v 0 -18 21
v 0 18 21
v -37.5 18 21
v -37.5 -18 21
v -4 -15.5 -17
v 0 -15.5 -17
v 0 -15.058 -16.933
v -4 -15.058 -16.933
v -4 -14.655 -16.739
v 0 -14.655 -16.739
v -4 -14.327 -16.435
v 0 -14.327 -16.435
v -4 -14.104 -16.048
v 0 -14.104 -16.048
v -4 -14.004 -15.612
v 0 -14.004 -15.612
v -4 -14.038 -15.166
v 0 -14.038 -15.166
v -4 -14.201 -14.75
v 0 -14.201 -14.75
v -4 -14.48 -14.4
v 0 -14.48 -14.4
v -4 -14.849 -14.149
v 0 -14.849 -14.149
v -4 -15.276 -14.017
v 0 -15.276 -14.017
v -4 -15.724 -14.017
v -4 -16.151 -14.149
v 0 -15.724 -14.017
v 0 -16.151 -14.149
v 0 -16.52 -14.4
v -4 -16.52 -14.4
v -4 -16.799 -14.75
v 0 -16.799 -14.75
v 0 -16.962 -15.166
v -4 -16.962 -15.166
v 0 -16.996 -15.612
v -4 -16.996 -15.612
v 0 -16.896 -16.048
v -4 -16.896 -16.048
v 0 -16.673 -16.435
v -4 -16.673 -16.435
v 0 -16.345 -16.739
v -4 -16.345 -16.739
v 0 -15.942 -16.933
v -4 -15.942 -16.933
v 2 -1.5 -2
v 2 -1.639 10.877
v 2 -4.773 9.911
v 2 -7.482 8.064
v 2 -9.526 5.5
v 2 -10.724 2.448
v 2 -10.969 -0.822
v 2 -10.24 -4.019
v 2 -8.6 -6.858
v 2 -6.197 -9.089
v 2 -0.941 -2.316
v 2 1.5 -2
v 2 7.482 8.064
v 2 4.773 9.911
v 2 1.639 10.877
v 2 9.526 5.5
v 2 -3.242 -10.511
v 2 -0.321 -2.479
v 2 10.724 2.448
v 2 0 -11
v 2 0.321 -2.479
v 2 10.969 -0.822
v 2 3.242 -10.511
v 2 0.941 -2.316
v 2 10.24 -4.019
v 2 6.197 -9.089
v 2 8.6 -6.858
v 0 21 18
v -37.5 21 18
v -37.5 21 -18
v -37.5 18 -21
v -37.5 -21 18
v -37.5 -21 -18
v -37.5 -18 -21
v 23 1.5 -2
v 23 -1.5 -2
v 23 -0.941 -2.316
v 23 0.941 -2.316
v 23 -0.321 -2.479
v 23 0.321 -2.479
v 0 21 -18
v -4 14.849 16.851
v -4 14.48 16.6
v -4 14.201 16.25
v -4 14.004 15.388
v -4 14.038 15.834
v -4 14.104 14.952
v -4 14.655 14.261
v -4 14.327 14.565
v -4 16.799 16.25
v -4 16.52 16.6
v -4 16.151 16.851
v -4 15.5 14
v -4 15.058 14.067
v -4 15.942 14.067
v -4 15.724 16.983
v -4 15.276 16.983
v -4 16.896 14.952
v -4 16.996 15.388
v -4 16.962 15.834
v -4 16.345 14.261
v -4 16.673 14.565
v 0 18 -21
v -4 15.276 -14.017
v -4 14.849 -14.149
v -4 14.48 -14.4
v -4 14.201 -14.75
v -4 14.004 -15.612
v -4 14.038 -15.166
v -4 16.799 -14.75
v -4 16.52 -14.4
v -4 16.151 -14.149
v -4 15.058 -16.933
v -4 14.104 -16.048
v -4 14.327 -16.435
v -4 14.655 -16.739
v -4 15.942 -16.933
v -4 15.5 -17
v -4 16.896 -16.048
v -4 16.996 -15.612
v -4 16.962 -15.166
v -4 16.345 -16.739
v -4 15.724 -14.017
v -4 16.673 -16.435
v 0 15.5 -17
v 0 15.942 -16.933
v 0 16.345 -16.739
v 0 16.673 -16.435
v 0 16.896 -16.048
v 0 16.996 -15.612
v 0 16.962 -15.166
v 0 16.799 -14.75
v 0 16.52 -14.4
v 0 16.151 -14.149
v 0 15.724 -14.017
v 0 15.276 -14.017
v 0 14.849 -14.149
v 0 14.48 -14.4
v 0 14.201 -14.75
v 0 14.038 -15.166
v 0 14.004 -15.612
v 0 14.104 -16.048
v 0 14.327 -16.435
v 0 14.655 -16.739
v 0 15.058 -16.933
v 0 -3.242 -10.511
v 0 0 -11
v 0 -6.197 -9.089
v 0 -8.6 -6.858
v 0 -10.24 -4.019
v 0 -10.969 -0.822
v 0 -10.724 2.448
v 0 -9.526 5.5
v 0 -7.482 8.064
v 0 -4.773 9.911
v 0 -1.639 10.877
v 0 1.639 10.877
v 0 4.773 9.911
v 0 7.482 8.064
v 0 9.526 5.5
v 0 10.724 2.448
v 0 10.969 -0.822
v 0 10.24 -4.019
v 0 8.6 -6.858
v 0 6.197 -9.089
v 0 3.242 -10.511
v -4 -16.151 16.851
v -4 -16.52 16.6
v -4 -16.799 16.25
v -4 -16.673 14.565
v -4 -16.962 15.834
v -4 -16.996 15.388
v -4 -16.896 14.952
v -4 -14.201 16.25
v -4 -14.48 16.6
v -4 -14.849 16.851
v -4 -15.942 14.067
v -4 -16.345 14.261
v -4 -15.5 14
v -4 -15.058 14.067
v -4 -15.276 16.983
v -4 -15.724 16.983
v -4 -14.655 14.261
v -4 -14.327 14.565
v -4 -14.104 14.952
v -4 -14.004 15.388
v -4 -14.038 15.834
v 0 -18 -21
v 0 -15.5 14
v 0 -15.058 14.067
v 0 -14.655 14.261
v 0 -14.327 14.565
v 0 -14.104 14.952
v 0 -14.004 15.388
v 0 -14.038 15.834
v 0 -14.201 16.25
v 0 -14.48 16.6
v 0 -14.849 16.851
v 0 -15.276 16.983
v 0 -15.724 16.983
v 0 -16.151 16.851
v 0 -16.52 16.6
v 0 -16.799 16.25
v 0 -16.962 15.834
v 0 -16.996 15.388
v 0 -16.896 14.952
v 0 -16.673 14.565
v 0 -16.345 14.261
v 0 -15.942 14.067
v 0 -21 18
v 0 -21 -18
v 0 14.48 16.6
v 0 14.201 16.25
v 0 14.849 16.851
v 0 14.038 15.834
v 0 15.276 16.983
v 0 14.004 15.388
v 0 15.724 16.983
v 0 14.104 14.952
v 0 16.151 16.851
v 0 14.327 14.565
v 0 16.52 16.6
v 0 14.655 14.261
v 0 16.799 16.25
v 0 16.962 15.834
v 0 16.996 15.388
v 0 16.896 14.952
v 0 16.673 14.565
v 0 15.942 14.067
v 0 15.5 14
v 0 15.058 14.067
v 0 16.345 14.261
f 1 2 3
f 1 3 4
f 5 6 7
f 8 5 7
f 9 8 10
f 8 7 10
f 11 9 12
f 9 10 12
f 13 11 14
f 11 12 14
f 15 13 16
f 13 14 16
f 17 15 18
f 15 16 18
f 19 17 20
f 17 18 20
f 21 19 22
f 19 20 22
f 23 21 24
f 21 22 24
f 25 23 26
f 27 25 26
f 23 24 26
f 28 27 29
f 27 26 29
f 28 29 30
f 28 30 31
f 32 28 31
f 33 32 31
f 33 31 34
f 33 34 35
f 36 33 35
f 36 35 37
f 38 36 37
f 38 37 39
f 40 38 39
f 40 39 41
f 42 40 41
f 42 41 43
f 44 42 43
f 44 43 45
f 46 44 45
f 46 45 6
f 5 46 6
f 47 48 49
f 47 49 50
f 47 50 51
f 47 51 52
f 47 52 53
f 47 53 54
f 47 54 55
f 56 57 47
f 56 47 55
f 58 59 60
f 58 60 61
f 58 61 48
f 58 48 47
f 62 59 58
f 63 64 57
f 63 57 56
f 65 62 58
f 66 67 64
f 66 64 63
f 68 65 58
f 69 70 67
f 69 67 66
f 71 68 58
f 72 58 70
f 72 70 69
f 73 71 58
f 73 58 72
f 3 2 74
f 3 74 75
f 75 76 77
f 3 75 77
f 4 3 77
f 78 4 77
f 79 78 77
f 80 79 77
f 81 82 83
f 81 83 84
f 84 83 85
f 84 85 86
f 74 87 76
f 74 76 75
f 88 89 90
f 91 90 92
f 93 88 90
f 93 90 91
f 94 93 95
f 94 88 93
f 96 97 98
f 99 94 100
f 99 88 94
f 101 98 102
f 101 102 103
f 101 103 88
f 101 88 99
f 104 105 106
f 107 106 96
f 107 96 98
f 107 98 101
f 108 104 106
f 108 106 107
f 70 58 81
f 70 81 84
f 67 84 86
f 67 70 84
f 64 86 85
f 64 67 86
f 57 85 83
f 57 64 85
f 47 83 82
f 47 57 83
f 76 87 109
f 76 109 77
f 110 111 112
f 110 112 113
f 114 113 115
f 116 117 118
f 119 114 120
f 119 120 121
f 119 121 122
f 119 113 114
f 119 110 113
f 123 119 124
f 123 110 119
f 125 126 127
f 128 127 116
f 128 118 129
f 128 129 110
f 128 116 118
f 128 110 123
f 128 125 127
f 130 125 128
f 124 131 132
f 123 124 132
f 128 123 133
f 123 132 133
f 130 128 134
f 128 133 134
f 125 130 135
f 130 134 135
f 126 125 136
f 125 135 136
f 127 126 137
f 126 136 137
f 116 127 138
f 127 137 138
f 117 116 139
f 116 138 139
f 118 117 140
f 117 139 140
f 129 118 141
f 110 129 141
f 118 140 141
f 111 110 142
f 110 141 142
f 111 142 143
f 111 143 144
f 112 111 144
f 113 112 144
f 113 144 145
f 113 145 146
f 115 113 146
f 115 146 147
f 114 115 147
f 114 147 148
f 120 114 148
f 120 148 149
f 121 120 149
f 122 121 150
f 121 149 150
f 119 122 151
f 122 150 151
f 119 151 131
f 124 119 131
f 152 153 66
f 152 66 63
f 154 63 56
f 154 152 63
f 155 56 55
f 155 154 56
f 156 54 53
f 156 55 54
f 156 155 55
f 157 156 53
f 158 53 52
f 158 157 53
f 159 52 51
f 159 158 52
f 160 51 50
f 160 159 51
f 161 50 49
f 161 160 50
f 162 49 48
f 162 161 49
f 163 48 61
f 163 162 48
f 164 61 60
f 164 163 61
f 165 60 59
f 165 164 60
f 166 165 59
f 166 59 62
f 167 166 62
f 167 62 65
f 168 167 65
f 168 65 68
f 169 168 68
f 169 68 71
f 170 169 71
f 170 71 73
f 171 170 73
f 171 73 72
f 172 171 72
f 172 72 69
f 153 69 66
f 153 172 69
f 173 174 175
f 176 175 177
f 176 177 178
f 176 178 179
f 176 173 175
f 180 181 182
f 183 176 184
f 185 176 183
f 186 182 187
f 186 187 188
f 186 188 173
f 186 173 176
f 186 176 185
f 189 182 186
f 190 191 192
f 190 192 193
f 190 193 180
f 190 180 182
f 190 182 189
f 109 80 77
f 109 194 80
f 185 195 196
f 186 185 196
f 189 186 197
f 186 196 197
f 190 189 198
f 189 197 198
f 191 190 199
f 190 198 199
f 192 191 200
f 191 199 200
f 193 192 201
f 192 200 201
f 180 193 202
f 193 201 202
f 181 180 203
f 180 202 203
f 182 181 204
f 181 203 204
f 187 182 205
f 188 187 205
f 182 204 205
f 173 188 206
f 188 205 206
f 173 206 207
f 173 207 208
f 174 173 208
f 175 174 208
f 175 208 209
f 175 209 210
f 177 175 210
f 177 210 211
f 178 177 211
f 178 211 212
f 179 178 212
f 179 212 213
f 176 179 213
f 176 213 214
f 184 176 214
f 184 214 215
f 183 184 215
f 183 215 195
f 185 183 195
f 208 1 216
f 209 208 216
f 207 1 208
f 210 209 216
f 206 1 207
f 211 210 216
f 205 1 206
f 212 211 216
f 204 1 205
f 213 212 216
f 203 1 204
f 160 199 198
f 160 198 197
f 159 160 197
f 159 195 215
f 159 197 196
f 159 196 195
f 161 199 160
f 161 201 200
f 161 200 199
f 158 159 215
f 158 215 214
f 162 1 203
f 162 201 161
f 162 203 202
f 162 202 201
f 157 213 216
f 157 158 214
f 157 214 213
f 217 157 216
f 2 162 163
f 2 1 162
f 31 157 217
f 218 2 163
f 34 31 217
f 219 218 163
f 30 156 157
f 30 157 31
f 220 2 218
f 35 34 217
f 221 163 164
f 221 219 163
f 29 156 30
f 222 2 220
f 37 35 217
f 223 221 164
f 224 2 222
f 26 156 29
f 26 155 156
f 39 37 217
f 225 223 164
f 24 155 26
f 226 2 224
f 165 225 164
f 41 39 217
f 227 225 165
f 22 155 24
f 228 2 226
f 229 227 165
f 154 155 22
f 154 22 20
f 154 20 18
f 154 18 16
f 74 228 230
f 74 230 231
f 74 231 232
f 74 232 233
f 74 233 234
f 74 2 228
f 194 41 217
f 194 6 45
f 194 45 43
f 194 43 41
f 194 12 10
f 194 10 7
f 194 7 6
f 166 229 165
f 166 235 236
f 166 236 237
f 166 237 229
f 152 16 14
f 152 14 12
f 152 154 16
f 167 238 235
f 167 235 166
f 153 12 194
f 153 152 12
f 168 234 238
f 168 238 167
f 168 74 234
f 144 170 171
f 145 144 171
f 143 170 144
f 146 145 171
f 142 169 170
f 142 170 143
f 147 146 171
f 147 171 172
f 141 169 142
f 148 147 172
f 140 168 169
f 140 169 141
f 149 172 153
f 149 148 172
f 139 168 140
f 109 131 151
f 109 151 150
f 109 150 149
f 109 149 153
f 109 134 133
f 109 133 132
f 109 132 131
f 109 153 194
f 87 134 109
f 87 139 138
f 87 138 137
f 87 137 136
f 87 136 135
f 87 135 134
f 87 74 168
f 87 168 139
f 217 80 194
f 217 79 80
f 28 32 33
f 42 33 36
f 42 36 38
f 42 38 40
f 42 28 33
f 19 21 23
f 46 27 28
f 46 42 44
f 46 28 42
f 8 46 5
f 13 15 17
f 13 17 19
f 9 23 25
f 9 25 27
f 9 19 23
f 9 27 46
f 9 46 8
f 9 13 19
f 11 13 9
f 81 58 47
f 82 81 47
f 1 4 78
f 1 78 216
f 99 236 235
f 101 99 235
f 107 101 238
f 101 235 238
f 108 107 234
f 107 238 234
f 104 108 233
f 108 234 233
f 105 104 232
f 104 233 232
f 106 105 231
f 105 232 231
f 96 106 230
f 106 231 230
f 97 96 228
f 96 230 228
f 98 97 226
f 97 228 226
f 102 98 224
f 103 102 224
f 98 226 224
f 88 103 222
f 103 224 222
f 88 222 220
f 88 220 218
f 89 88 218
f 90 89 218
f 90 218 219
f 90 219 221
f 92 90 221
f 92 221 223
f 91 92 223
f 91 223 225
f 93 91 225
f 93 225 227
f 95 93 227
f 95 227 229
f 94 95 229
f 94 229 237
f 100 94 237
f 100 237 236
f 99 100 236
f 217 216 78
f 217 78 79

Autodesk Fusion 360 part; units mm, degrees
sketch "Skizze1" plane through (0, 0, 0) normal (1, 0, 0) x (0, 0, -1)
  line L0 (21, 21) -> (-21, 21)
  line L1 (-21, 21) -> (-21, -21)
  line L2 (-21, -21) -> (21, -21)
  line L3 (21, -21) -> (21, 21)
  line L4 (21, 21) -> (-21, -21) construction
  line L5 (-21, 21) -> (21, -21) construction
  line L6 (15.5, -15.5) -> (-15.5, -15.5)
  line L7 (-15.5, -15.5) -> (-15.5, 15.5)
  line L8 (-15.5, 15.5) -> (15.5, 15.5)
  line L9 (15.5, 15.5) -> (15.5, -15.5)
  line L10 (15.5, -15.5) -> (-15.5, 15.5) construction
  line L11 (-15.5, -15.5) -> (15.5, 15.5) construction
  circle A0 centre (15.5, -15.5) radius 1.5
  circle A1 centre (-15.5, -15.5) radius 1.5
  circle A2 centre (-15.5, 15.5) radius 1.5
  circle A3 centre (15.5, 15.5) radius 1.5
  circle A4 centre (0, 0) radius 11
  circle A5 centre (0, 0) radius 2.5
  line L12 (0, 0) -> (2, 0)
  line L13 (2, 0) -> (2, 1.5)
  line L14 (2, 0) -> (2, -1.5)
  dimension "d1" = 42
  dimension "d2" = 42
  dimension "d5" = 31
  dimension "d6" = 31
  dimension "d7" = 3
  dimension "d8" = 3
  dimension "d9" = 3
  dimension "d10" = 3
  dimension "d13" = 22
  dimension "d16" = 5
  dimension "d20" = 2
extrude "Extrusion1" add sketch "Skizze1" against normal blind 37.5 contours L0 L1 L2 L3 | L6 L7 A1 | L6 L7 L8 L9 A0 A1 A2 A3 | L6 L7 A1 | L6 L9 A0 | L6 L9 A0 | L7 L8 A2 | L7 L8 A2 | L8 L9 A3 | L8 L9 A3 | A4 | A5 L13 L14 | A5 L13 L14
extrude "Extrusion2" cut sketch "Skizze1" against normal blind 4 contours L6 L7 A1 | L6 L7 A1 | L6 L9 A0 | L6 L9 A0 | L7 L8 A2 | L7 L8 A2 | L8 L9 A3 | L8 L9 A3
extrude "Extrusion3" add sketch "Skizze1" along normal blind 2 contours A4 | A5 L13 L14 | A5 L13 L14
extrude "Extrusion4" add sketch "Skizze1" along normal blind 23 contours A5 L13 L14 picked at (2.3264, 0.107)
chamfer "Fase1" distance 3 angle 45 4 edges at (-18.75, 21, 21) (-18.75, 21, -21) (-18.75, -21, -21) (-18.75, -21, 21)
